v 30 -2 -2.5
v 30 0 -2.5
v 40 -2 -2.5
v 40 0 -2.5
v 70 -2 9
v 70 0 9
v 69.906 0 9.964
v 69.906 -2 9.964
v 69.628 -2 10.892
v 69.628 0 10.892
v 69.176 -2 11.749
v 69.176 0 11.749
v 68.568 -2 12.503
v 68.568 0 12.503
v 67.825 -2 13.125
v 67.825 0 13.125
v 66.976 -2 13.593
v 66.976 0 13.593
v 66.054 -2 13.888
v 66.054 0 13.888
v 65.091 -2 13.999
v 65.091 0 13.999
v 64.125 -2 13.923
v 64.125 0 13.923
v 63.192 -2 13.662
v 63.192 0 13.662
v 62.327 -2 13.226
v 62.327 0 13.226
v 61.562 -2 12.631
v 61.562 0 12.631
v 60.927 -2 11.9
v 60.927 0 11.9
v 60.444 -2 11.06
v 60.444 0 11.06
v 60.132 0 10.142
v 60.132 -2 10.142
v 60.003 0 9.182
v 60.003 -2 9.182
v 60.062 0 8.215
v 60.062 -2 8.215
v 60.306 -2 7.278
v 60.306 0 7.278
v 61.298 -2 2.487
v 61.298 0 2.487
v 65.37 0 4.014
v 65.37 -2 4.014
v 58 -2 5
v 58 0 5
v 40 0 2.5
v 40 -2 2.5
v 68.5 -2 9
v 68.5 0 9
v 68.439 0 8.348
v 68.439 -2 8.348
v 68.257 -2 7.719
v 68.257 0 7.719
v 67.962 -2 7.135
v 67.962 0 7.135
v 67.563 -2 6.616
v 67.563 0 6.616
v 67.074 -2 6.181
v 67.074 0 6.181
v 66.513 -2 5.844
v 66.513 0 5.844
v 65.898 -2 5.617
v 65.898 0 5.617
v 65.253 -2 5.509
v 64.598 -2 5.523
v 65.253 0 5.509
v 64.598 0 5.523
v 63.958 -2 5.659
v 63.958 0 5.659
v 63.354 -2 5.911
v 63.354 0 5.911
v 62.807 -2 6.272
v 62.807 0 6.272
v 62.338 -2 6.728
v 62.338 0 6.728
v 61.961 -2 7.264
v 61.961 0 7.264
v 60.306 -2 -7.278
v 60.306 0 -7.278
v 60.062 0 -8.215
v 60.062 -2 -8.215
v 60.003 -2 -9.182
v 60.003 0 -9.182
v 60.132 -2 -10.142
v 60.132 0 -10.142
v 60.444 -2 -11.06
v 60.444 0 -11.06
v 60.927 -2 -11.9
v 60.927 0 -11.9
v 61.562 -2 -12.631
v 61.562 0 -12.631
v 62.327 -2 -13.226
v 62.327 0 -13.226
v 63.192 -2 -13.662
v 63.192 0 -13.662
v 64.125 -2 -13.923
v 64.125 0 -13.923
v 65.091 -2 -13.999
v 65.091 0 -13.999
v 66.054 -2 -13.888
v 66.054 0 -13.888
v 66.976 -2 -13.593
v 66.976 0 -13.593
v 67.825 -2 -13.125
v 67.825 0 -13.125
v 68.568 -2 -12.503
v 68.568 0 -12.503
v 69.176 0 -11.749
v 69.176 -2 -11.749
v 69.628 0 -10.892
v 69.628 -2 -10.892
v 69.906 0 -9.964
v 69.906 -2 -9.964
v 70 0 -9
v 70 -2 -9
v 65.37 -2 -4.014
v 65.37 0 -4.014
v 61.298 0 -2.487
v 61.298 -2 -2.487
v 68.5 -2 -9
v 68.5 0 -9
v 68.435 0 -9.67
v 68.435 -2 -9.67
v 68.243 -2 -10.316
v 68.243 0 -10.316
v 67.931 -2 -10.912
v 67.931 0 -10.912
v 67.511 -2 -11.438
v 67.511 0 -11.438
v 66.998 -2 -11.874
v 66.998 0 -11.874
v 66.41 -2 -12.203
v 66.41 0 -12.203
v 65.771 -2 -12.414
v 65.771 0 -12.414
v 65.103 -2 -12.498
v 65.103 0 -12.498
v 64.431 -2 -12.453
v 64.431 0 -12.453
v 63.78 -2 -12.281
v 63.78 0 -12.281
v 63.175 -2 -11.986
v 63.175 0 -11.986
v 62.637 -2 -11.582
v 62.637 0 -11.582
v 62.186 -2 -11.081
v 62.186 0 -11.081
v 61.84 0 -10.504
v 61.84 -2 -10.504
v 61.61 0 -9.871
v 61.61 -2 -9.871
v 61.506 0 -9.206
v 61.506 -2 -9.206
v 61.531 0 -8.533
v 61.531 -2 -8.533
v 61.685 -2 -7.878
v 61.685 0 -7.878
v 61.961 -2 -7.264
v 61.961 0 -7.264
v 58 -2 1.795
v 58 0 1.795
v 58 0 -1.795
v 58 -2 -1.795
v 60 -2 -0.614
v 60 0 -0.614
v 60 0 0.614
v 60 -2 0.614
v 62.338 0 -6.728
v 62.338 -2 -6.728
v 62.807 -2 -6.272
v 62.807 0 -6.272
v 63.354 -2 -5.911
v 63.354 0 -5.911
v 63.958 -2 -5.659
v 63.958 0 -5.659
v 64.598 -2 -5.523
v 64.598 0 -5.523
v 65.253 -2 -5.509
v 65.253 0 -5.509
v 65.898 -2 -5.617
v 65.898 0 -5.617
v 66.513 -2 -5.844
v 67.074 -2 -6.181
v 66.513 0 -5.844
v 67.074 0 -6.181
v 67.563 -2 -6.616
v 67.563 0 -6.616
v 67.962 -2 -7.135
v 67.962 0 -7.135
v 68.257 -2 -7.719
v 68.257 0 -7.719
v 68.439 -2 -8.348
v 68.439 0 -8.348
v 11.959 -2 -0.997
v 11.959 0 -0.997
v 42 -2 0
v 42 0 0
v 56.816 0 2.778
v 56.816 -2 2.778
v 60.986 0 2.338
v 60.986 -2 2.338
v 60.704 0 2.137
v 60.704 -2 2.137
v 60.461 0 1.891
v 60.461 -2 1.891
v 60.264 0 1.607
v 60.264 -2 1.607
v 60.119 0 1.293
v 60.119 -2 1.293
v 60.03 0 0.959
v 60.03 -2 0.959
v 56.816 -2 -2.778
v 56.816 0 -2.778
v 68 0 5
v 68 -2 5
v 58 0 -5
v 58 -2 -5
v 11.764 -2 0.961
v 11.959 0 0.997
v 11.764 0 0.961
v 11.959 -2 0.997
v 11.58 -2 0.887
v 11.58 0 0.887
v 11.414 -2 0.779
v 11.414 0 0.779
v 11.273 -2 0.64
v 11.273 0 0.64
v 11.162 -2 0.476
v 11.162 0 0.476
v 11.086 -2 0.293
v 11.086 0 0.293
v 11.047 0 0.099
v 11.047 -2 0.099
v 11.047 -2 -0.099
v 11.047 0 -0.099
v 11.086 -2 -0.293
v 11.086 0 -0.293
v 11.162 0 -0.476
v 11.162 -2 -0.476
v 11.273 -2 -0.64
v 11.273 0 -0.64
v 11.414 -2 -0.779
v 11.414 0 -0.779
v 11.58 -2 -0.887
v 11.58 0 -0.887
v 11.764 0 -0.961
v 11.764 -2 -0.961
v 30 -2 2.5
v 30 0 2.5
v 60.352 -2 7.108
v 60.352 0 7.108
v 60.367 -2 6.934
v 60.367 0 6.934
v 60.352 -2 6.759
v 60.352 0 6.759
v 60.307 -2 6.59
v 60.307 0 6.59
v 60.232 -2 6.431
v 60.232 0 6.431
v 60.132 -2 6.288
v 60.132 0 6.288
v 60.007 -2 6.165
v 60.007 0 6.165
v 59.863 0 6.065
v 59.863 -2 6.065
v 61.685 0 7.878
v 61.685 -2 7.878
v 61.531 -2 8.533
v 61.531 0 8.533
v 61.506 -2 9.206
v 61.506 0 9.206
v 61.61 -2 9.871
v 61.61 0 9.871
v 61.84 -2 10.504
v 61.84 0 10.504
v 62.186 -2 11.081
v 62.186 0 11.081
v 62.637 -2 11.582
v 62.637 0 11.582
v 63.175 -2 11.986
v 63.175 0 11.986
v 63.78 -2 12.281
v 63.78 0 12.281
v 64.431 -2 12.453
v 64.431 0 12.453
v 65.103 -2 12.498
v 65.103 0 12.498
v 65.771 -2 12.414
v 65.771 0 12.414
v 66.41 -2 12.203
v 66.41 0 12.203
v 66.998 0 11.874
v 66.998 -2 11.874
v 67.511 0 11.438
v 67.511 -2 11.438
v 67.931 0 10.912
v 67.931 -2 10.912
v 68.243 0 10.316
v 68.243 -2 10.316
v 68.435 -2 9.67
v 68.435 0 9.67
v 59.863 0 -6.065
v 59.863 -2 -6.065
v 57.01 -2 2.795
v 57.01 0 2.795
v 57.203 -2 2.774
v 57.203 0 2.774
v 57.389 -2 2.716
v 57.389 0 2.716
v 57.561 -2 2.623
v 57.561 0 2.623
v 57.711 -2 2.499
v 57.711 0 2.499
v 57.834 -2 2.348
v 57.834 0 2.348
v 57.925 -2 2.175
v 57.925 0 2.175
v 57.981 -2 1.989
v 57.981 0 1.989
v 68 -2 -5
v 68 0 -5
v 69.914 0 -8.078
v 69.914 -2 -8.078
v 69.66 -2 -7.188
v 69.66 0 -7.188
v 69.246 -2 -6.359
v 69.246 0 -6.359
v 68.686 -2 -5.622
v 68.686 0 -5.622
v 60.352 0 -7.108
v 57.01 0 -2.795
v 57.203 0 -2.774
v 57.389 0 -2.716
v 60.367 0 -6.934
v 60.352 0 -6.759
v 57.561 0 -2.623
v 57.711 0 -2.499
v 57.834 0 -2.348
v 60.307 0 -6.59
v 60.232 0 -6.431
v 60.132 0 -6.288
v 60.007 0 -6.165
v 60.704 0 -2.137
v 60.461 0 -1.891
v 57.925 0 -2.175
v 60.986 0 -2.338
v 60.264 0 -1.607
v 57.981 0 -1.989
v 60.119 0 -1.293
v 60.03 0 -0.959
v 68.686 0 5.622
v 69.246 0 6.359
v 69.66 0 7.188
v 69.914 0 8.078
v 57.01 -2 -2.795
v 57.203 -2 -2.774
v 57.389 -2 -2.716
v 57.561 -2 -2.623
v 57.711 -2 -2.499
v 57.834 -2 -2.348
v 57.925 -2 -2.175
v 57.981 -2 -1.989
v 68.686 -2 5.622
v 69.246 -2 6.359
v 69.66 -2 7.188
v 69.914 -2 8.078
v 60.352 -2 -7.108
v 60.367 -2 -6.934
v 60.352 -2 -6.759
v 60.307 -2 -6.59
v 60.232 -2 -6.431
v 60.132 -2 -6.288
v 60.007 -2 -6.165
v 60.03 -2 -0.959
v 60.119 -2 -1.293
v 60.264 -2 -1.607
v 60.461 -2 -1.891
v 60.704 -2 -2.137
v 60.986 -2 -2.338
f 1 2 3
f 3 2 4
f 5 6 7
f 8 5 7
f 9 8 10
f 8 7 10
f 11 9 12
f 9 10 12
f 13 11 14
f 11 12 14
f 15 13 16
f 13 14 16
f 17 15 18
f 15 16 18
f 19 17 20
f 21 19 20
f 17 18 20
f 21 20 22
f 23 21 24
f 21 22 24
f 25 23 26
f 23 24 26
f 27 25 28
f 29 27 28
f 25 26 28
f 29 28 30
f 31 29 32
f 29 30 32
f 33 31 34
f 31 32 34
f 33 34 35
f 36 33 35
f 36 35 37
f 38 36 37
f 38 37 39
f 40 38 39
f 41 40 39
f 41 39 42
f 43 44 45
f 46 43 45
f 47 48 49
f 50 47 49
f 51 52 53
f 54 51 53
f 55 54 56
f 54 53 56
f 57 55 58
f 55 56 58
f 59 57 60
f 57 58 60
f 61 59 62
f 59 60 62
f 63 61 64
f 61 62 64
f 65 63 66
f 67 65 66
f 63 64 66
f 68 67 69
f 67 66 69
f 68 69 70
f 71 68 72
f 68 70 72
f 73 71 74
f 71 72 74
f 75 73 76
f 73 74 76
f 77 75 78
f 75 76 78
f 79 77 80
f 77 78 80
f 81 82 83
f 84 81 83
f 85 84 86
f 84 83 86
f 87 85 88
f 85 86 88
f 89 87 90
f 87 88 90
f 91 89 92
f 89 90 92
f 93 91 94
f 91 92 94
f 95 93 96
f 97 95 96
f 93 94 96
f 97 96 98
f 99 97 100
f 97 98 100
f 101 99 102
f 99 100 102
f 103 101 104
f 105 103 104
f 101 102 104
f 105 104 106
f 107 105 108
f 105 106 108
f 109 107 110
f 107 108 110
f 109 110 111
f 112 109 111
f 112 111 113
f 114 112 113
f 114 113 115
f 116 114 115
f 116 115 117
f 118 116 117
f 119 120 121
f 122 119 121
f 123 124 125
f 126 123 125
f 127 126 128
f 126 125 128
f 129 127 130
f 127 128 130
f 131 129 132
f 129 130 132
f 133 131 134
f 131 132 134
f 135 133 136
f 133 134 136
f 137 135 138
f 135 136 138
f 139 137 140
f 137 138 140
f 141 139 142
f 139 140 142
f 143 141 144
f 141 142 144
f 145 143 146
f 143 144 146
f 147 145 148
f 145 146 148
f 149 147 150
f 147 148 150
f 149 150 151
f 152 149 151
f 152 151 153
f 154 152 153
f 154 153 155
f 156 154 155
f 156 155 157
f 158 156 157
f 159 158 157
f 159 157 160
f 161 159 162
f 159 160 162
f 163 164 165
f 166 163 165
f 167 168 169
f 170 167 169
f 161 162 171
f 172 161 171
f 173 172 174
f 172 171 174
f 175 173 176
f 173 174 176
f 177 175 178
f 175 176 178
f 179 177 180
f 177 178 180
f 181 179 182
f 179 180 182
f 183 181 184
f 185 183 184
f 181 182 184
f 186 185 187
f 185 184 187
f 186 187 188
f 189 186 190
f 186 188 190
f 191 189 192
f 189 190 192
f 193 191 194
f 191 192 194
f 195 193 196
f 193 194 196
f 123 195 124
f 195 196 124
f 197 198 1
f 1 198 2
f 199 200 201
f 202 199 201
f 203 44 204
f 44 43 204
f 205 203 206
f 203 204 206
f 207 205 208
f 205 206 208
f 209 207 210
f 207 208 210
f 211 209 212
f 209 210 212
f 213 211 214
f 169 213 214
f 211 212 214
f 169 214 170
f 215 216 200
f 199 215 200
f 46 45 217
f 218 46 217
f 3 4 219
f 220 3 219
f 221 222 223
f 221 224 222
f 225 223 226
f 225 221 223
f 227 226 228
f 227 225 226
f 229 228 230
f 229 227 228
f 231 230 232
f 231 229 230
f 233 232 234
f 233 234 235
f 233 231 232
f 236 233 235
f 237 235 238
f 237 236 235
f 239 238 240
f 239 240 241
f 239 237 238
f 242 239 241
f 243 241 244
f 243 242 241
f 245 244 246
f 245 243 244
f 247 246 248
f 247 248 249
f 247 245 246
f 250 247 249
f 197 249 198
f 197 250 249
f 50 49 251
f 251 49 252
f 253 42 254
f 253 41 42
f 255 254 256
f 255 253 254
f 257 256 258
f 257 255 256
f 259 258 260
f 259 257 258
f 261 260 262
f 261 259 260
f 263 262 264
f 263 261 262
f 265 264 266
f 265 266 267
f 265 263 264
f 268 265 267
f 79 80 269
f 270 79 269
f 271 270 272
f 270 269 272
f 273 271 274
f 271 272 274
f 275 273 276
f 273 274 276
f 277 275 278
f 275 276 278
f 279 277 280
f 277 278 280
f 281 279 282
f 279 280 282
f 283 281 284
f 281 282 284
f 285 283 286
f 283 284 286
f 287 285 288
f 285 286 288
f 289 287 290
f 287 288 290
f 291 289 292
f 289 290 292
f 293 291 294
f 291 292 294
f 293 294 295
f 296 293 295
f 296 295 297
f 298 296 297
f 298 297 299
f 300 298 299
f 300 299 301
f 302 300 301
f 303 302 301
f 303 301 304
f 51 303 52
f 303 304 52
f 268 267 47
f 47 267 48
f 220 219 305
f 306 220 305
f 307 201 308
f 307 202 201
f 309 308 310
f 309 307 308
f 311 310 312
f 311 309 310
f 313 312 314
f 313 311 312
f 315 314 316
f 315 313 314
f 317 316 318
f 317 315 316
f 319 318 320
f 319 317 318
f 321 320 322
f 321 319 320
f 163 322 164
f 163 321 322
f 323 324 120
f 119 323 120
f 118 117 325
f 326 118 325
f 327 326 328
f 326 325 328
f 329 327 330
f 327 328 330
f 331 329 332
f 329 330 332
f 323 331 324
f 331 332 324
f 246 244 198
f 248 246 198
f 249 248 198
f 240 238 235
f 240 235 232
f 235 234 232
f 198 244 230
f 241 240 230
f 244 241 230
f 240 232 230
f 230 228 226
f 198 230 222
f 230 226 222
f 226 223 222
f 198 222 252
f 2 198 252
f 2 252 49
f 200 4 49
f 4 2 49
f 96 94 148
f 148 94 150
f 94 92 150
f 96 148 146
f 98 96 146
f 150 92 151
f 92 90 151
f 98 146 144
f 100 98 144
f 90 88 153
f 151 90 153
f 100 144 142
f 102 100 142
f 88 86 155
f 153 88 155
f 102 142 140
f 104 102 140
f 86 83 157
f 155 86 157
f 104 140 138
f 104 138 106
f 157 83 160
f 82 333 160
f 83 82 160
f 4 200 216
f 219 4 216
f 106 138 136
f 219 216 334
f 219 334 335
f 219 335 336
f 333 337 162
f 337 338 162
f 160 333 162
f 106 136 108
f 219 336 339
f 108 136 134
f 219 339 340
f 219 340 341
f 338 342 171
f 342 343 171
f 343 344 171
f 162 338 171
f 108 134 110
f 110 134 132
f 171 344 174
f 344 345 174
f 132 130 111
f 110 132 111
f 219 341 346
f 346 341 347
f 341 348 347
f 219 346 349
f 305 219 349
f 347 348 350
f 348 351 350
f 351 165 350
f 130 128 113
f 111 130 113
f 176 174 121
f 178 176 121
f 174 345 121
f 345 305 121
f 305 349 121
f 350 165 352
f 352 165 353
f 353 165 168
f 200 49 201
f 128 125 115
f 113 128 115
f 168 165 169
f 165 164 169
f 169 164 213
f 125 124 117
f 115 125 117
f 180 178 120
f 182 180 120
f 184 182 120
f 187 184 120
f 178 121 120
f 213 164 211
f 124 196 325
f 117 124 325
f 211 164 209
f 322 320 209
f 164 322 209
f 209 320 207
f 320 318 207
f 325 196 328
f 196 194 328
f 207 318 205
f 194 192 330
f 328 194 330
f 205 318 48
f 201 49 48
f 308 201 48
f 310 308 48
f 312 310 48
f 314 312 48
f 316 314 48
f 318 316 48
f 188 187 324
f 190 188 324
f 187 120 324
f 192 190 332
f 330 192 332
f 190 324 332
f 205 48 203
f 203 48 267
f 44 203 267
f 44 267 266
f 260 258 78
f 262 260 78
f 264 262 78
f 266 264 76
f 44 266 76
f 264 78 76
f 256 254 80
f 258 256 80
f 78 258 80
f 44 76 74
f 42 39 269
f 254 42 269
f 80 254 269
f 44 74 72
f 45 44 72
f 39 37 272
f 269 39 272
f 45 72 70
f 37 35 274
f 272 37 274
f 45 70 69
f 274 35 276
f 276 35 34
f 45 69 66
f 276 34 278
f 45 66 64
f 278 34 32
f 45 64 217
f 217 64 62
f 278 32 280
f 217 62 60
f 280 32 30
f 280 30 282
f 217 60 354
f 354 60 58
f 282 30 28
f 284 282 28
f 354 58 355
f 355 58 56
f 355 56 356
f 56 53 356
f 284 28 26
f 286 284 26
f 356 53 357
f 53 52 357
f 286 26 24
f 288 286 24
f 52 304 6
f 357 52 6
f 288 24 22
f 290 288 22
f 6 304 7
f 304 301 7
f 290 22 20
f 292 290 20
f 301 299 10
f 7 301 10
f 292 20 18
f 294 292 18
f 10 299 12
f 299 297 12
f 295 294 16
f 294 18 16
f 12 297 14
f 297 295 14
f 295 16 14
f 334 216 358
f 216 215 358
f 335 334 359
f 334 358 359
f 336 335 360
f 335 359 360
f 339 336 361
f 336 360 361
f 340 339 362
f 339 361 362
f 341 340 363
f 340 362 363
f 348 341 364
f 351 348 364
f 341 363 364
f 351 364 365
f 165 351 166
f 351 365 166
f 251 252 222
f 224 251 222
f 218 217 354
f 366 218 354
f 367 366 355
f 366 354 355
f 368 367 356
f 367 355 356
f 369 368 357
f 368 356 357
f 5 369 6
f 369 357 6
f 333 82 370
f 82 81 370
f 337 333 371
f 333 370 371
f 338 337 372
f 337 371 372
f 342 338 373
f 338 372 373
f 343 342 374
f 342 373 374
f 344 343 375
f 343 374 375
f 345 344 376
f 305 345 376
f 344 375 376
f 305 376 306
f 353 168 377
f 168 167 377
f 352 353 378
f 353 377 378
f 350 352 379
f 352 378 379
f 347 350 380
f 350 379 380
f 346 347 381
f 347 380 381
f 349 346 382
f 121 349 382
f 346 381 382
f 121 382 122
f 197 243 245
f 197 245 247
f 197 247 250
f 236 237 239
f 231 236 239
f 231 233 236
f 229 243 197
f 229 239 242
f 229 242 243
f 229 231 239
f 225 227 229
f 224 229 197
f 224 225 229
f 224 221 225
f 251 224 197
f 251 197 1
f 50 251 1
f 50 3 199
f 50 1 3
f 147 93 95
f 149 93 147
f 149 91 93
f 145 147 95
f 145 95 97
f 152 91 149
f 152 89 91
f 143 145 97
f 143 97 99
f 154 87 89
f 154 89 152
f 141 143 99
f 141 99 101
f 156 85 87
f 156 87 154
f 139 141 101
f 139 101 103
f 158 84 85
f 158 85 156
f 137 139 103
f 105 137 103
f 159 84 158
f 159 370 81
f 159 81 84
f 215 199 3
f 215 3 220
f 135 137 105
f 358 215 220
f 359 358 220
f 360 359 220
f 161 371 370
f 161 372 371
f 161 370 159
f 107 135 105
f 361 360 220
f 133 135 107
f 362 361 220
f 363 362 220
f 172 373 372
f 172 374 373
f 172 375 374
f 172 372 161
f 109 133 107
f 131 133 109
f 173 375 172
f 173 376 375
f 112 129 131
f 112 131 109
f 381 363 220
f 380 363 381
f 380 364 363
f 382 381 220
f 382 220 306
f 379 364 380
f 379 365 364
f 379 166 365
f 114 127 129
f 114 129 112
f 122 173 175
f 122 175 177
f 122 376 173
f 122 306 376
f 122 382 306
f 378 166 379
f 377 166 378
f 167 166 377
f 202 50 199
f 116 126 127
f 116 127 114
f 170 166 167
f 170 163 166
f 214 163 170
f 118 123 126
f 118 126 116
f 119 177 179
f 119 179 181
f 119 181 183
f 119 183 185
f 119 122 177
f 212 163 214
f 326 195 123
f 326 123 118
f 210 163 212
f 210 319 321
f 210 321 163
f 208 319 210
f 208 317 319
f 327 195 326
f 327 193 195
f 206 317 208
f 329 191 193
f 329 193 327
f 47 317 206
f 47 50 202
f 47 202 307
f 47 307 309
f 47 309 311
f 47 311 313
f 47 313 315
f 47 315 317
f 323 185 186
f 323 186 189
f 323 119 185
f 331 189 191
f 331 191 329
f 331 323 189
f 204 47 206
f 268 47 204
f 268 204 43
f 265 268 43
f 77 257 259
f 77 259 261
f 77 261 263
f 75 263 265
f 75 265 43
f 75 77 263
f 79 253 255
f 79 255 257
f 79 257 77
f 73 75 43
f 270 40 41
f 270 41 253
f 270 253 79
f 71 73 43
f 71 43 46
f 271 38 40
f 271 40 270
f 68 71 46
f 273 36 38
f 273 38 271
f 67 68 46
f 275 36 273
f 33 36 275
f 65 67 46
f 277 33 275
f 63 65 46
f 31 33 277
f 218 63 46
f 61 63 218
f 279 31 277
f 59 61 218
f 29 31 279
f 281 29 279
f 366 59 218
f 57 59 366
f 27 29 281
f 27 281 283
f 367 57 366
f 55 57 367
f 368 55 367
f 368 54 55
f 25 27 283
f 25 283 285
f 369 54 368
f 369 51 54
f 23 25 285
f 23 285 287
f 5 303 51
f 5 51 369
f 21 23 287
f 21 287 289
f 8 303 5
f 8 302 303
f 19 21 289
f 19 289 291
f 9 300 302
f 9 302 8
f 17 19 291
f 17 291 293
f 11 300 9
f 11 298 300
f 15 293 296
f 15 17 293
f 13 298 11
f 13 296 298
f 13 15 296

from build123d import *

# Parameters (mm, degrees)
F1_DEPTH = 2
F2_R     = 2
F3_R     = 1


with BuildPart() as f1:
    # F0 (on Front) → F1 (new body)
    with BuildSketch(Plane.XZ):
        with BuildLine():
            Line((30, 2.5), (0, 0))
            Line((0, 0), (42, 0))
            Line((42, 0), (58, 3))
            Line((58, 3), (58, 0))
            Line((58, 0), (60, 0))
            Line((60, 0), (60, 2))
            Line((60, 2), (65.3698630137, 4.0136986301))
            ThreePointArc((65.3698630137, 4.0136986301), (62.6521442193, 4.5855268454), (60.6587842894, 6.5193053082))
            Line((60.6587842894, 6.5193053082), (58, 5))
            Line((58, 5), (40, 2.5))
            Line((40, 2.5), (30, 2.5))
        make_face()
        with BuildLine():
            Line((42, 0), (0, 0))
            Line((0, 0), (30, -2.5))
            Line((30, -2.5), (40, -2.5))
            Line((40, -2.5), (58, -5))
            Line((58, -5), (60.6587842894, -6.5193053082))
            ThreePointArc((60.6587842894, -6.5193053082), (62.6521442193, -4.5855268454), (65.3698630137, -4.0136986301))
            Line((65.3698630137, -4.0136986301), (60, -2))
            Line((60, -2), (60, 0))
            Line((60, 0), (58, 0))
            Line((58, 0), (58, -3))
            Line((58, -3), (42, 0))
        make_face()
        with BuildLine():
            ThreePointArc((70, 9), (63.7166603242, 13.8324982438), (60.6587842894, 6.5193053082))
            ThreePointArc((60.6587842894, 6.5193053082), (62.6521442193, 4.5855268454), (65.3698630137, 4.0136986301))
            Line((65.3698630137, 4.0136986301), (68, 5))
            ThreePointArc((68, 5), (69.472135955, 6.7639320225), (70, 9))
        make_face()
        with BuildLine():
            ThreePointArc((68.5, 9), (65.898337773, 5.6172512293), (61.9611490026, 7.2635137158))
            ThreePointArc((61.9611490026, 7.2635137158), (64.101662227, 12.3827487707), (68.5, 9))
        make_face(mode=Mode.SUBTRACT)
        with BuildLine():
            ThreePointArc((65.3698630137, -4.0136986301), (62.6521442193, -4.5855268454), (60.6587842894, -6.5193053082))
            ThreePointArc((60.6587842894, -6.5193053082), (63.7166603242, -13.8324982438), (70, -9))
            ThreePointArc((70, -9), (69.472135955, -6.7639320225), (68, -5))
            Line((68, -5), (65.3698630137, -4.0136986301))
        make_face()
        with BuildLine():
            ThreePointArc((68.5, -9), (64.101662227, -12.3827487707), (61.9611490026, -7.2635137158))
            ThreePointArc((61.9611490026, -7.2635137158), (65.898337773, -5.6172512293), (68.5, -9))
        make_face(mode=Mode.SUBTRACT)
    extrude(amount=F1_DEPTH)

    # F2
    f2_edges = [f1.edges().sort_by_distance(p)[0] for p in [
        (60, -1, 2),
        (60, -1, -2),
    ]]
    fillet(f2_edges, radius=F2_R)

    # F3
    f3_edges = [f1.edges().sort_by_distance(p)[0] for p in [
        (58, -1, 3),
        (58, -1, -3),
        (60.658784, -1, -6.519305),
        (60.658784, -1, 6.519305),
        (0, -1, 0),
    ]]
    fillet(f3_edges, radius=F3_R)


solid = f1.part
